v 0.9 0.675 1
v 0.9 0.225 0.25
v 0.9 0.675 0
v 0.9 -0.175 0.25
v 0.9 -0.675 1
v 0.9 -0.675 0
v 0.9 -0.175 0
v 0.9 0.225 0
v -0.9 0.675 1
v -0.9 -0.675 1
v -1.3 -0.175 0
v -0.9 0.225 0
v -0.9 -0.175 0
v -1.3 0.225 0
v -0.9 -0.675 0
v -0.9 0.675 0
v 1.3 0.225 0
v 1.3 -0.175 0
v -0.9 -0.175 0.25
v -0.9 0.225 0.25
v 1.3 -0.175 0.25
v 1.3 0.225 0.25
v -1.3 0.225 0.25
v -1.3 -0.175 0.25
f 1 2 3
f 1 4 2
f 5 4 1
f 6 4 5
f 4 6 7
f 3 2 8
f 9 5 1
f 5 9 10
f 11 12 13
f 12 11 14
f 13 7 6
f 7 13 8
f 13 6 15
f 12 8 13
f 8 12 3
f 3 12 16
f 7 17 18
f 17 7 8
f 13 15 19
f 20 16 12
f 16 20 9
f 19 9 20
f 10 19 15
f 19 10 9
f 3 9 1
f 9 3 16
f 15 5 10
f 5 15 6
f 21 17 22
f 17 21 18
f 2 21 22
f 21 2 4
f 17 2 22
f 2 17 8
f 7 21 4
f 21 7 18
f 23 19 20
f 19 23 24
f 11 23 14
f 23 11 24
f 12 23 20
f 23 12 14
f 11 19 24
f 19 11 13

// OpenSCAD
translate([-1.8/2, -1.35/2, 0]) {
	cube([1.8, 1.35, 1]);

	translate([1.8,0.5,0]) {
		cube([0.4, 0.4, 0.25]);
	}

	translate([-0.4,0.5,0]) {
		cube([0.4, 0.4, 0.25]);
	}
}
